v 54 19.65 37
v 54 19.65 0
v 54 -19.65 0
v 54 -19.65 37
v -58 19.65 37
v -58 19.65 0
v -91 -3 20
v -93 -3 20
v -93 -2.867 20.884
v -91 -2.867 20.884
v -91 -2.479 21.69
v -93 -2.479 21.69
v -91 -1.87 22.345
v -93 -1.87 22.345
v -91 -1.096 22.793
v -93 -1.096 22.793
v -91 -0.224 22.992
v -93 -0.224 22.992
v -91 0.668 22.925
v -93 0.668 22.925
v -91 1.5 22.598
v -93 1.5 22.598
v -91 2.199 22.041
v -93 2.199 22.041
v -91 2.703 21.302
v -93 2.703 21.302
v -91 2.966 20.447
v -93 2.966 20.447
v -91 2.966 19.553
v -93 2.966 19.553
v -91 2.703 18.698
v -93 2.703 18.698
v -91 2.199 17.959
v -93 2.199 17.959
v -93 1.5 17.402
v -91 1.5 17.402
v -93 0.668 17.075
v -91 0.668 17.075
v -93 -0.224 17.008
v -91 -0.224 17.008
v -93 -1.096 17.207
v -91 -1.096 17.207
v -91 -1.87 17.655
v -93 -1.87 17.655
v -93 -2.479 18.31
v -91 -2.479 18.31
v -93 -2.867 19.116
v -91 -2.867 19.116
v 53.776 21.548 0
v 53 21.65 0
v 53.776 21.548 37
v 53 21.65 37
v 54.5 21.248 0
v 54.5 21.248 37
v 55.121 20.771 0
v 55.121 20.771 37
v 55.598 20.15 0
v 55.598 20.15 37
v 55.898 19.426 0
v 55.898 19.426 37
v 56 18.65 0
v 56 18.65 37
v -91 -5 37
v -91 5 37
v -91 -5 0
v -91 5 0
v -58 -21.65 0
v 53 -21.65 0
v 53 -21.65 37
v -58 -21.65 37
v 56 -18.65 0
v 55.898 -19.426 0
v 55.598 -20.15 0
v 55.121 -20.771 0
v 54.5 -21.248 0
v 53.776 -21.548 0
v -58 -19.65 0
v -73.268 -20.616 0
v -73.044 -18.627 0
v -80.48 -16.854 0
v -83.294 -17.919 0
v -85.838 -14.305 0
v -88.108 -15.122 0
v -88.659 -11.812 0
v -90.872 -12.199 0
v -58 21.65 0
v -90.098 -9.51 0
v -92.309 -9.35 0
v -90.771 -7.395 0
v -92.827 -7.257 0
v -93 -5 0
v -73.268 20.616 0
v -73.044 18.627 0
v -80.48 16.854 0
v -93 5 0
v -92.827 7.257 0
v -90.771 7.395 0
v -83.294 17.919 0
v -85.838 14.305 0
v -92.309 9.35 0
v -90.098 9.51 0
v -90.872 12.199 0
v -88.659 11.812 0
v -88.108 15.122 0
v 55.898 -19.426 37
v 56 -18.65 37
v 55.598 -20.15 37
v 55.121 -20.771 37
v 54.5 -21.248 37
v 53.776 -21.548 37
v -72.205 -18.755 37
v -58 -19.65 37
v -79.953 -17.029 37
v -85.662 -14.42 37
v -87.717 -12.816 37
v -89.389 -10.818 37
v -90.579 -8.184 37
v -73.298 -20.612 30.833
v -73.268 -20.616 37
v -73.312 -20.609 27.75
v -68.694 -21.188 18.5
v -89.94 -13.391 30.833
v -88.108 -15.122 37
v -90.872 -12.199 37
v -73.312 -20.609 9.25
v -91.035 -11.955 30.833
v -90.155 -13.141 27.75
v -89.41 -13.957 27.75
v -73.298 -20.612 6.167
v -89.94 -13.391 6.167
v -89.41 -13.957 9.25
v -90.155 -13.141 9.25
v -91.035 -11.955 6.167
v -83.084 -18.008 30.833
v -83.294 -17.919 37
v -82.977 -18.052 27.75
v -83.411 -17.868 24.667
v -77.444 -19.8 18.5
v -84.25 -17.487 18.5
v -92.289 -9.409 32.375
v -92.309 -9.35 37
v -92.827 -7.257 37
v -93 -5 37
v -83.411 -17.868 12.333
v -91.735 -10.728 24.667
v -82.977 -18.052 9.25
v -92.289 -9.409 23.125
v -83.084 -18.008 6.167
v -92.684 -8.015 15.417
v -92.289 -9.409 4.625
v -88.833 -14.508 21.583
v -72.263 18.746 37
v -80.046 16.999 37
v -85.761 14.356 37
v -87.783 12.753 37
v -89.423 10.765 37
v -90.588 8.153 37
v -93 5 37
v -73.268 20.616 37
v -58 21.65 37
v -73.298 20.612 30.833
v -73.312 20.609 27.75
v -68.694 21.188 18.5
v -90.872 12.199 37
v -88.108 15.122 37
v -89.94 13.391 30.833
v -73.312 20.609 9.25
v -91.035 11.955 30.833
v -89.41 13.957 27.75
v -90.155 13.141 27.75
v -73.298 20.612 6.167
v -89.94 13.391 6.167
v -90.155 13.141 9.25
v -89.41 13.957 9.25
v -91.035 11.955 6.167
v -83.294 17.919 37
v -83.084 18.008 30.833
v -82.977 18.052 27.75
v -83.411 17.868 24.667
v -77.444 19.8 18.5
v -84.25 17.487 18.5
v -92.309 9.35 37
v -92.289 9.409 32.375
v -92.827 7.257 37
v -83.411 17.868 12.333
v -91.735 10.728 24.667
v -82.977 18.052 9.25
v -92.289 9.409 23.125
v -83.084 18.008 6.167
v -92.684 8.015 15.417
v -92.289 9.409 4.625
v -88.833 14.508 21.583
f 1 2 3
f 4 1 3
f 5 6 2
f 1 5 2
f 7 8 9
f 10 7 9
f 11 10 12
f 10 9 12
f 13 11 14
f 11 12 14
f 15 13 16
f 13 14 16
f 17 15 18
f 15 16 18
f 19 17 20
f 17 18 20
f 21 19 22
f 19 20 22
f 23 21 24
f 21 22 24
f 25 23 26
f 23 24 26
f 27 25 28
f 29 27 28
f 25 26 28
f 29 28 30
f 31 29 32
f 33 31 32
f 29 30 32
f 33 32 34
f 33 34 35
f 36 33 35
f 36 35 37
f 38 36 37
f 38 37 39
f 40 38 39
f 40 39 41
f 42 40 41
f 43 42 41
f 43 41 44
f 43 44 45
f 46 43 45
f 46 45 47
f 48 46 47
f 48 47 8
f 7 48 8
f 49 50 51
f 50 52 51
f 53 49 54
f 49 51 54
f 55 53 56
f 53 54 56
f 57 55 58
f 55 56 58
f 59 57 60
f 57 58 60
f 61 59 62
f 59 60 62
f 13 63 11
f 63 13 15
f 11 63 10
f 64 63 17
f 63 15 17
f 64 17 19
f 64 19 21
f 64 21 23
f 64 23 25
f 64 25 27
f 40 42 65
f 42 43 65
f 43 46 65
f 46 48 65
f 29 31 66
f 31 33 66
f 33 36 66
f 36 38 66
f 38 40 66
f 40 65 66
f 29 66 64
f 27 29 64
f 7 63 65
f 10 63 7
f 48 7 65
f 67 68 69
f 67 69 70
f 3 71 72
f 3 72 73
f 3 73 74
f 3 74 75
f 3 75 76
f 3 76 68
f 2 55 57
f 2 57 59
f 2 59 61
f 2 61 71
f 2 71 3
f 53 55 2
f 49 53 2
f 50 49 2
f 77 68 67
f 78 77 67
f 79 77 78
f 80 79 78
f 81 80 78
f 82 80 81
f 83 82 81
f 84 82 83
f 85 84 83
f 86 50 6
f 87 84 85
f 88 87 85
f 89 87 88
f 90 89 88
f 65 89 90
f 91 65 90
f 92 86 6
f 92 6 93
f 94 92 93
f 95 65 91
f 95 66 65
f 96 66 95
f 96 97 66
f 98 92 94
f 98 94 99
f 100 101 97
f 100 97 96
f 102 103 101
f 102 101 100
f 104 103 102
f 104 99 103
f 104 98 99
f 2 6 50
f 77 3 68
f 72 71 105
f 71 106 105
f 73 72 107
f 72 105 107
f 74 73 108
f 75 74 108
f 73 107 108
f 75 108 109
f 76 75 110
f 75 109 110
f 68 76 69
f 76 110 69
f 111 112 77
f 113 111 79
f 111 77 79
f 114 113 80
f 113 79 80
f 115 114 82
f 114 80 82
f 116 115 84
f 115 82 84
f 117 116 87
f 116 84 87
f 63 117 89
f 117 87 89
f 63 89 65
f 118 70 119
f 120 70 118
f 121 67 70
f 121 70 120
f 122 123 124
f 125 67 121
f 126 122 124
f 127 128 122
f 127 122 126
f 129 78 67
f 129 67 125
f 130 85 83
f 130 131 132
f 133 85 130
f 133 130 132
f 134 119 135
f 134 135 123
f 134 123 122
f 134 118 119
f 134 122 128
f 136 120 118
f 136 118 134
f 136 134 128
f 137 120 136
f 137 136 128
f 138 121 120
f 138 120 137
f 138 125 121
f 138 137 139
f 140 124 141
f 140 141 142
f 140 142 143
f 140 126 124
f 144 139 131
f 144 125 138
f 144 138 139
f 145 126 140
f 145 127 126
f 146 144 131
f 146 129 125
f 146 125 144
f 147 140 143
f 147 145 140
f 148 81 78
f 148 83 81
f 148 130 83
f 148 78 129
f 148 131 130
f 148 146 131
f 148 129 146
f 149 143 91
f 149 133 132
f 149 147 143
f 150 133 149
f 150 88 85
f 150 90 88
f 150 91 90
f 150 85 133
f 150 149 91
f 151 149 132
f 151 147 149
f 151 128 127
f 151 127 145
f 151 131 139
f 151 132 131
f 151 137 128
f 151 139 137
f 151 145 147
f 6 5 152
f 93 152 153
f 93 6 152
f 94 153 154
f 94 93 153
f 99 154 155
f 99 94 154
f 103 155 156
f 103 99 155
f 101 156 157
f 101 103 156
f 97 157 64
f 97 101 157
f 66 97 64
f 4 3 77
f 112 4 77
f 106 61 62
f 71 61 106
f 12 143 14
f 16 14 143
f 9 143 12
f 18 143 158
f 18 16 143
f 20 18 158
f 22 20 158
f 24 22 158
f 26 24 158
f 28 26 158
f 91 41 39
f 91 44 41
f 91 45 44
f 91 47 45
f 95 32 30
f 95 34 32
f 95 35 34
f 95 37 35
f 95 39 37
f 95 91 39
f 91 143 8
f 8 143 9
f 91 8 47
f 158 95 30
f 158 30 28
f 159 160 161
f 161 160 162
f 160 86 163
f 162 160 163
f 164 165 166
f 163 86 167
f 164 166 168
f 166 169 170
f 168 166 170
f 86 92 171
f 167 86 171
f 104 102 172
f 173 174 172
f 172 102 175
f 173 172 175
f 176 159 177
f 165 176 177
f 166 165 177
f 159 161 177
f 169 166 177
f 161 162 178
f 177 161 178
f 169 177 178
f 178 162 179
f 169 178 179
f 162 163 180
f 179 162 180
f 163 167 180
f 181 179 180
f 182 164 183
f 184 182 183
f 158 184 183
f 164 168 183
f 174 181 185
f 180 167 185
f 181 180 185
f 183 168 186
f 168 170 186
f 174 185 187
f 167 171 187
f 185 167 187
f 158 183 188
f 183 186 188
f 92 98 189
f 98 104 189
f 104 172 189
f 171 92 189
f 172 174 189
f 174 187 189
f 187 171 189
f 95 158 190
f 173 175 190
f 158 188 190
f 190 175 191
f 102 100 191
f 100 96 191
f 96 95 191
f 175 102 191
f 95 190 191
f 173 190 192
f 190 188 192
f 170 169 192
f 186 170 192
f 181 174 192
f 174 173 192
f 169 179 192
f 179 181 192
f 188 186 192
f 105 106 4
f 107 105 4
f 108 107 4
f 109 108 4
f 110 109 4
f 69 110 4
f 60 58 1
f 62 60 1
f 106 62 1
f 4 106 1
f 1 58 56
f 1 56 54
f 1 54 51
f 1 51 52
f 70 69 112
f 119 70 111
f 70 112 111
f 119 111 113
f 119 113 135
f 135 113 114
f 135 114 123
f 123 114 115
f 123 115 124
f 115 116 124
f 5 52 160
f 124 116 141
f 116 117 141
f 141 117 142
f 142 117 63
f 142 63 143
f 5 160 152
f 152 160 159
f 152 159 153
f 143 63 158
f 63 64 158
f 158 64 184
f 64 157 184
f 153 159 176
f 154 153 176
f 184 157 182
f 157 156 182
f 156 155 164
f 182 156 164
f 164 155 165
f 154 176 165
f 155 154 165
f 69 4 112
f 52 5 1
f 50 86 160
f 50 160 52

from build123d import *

# Parameters (mm, degrees)
PAD_DEPTH   = 37
THICKNESS_T = -2
SKETCH002_R = 3
HOLE_DEPTH  = 25
HOLE_TIPS_R = 3
FILLET_R    = 3


with BuildPart() as part:
    # Sketch001 → Pad (new body)
    with BuildSketch(Plane.XY):
        with BuildLine():
            Line((-58, 21.65), (56, 21.65))
            Line((56, 21.65), (56, -21.65))
            Line((56, -21.65), (-58, -21.65))
            add(Edge.make_bspline(
                [(-58, -21.65), (-93, -21.65), (-93, -5)],
                knots=[0, 0, 0, 1, 1, 1], degree=2))
            Line((-93, -5), (-93, 5))
            add(Edge.make_bspline(
                [(-58, 21.65), (-93, 21.65), (-93, 5)],
                knots=[0, 0, 0, 1, 1, 1], degree=2))
        make_face()
    extrude(amount=PAD_DEPTH)

    # Thickness
    thickness_openings = [part.faces().sort_by_distance(p)[0] for p in [
        (-16.404598, 0, 37),
        (-16.404598, 0, 0),
    ]]
    offset(amount=THICKNESS_T, openings=thickness_openings)

    # Sketch002 (on Face5 of Thickness) → Hole (cut)
    with BuildSketch(Plane(origin=(-93, 0, 0), x_dir=(0, -1, 0), z_dir=(-1, 0, 0))):
        with Locations((0, 20)):
            Circle(SKETCH002_R)
    extrude(amount=-HOLE_DEPTH, mode=Mode.SUBTRACT)

    # Hole tips → Hole tip 1 section 0
    with BuildSketch(Plane(origin=(-68, 0, 0), x_dir=(0, -1, 0), z_dir=(-1, 0, 0)), mode=Mode.PRIVATE) as hole_tip_1_s0:
        with Locations((0, 20)):
            Circle(HOLE_TIPS_R)
    loft([hole_tip_1_s0.sketch, Vertex(-66.197418, 0, 20)], mode=Mode.SUBTRACT)

    # Fillet
    fillet_edges = [part.edges().sort_by_distance(p)[0] for p in [
        (56, 21.65, 18.5),
        (56, -21.65, 18.5),
    ]]
    fillet(fillet_edges, radius=FILLET_R)


solid = part.part
